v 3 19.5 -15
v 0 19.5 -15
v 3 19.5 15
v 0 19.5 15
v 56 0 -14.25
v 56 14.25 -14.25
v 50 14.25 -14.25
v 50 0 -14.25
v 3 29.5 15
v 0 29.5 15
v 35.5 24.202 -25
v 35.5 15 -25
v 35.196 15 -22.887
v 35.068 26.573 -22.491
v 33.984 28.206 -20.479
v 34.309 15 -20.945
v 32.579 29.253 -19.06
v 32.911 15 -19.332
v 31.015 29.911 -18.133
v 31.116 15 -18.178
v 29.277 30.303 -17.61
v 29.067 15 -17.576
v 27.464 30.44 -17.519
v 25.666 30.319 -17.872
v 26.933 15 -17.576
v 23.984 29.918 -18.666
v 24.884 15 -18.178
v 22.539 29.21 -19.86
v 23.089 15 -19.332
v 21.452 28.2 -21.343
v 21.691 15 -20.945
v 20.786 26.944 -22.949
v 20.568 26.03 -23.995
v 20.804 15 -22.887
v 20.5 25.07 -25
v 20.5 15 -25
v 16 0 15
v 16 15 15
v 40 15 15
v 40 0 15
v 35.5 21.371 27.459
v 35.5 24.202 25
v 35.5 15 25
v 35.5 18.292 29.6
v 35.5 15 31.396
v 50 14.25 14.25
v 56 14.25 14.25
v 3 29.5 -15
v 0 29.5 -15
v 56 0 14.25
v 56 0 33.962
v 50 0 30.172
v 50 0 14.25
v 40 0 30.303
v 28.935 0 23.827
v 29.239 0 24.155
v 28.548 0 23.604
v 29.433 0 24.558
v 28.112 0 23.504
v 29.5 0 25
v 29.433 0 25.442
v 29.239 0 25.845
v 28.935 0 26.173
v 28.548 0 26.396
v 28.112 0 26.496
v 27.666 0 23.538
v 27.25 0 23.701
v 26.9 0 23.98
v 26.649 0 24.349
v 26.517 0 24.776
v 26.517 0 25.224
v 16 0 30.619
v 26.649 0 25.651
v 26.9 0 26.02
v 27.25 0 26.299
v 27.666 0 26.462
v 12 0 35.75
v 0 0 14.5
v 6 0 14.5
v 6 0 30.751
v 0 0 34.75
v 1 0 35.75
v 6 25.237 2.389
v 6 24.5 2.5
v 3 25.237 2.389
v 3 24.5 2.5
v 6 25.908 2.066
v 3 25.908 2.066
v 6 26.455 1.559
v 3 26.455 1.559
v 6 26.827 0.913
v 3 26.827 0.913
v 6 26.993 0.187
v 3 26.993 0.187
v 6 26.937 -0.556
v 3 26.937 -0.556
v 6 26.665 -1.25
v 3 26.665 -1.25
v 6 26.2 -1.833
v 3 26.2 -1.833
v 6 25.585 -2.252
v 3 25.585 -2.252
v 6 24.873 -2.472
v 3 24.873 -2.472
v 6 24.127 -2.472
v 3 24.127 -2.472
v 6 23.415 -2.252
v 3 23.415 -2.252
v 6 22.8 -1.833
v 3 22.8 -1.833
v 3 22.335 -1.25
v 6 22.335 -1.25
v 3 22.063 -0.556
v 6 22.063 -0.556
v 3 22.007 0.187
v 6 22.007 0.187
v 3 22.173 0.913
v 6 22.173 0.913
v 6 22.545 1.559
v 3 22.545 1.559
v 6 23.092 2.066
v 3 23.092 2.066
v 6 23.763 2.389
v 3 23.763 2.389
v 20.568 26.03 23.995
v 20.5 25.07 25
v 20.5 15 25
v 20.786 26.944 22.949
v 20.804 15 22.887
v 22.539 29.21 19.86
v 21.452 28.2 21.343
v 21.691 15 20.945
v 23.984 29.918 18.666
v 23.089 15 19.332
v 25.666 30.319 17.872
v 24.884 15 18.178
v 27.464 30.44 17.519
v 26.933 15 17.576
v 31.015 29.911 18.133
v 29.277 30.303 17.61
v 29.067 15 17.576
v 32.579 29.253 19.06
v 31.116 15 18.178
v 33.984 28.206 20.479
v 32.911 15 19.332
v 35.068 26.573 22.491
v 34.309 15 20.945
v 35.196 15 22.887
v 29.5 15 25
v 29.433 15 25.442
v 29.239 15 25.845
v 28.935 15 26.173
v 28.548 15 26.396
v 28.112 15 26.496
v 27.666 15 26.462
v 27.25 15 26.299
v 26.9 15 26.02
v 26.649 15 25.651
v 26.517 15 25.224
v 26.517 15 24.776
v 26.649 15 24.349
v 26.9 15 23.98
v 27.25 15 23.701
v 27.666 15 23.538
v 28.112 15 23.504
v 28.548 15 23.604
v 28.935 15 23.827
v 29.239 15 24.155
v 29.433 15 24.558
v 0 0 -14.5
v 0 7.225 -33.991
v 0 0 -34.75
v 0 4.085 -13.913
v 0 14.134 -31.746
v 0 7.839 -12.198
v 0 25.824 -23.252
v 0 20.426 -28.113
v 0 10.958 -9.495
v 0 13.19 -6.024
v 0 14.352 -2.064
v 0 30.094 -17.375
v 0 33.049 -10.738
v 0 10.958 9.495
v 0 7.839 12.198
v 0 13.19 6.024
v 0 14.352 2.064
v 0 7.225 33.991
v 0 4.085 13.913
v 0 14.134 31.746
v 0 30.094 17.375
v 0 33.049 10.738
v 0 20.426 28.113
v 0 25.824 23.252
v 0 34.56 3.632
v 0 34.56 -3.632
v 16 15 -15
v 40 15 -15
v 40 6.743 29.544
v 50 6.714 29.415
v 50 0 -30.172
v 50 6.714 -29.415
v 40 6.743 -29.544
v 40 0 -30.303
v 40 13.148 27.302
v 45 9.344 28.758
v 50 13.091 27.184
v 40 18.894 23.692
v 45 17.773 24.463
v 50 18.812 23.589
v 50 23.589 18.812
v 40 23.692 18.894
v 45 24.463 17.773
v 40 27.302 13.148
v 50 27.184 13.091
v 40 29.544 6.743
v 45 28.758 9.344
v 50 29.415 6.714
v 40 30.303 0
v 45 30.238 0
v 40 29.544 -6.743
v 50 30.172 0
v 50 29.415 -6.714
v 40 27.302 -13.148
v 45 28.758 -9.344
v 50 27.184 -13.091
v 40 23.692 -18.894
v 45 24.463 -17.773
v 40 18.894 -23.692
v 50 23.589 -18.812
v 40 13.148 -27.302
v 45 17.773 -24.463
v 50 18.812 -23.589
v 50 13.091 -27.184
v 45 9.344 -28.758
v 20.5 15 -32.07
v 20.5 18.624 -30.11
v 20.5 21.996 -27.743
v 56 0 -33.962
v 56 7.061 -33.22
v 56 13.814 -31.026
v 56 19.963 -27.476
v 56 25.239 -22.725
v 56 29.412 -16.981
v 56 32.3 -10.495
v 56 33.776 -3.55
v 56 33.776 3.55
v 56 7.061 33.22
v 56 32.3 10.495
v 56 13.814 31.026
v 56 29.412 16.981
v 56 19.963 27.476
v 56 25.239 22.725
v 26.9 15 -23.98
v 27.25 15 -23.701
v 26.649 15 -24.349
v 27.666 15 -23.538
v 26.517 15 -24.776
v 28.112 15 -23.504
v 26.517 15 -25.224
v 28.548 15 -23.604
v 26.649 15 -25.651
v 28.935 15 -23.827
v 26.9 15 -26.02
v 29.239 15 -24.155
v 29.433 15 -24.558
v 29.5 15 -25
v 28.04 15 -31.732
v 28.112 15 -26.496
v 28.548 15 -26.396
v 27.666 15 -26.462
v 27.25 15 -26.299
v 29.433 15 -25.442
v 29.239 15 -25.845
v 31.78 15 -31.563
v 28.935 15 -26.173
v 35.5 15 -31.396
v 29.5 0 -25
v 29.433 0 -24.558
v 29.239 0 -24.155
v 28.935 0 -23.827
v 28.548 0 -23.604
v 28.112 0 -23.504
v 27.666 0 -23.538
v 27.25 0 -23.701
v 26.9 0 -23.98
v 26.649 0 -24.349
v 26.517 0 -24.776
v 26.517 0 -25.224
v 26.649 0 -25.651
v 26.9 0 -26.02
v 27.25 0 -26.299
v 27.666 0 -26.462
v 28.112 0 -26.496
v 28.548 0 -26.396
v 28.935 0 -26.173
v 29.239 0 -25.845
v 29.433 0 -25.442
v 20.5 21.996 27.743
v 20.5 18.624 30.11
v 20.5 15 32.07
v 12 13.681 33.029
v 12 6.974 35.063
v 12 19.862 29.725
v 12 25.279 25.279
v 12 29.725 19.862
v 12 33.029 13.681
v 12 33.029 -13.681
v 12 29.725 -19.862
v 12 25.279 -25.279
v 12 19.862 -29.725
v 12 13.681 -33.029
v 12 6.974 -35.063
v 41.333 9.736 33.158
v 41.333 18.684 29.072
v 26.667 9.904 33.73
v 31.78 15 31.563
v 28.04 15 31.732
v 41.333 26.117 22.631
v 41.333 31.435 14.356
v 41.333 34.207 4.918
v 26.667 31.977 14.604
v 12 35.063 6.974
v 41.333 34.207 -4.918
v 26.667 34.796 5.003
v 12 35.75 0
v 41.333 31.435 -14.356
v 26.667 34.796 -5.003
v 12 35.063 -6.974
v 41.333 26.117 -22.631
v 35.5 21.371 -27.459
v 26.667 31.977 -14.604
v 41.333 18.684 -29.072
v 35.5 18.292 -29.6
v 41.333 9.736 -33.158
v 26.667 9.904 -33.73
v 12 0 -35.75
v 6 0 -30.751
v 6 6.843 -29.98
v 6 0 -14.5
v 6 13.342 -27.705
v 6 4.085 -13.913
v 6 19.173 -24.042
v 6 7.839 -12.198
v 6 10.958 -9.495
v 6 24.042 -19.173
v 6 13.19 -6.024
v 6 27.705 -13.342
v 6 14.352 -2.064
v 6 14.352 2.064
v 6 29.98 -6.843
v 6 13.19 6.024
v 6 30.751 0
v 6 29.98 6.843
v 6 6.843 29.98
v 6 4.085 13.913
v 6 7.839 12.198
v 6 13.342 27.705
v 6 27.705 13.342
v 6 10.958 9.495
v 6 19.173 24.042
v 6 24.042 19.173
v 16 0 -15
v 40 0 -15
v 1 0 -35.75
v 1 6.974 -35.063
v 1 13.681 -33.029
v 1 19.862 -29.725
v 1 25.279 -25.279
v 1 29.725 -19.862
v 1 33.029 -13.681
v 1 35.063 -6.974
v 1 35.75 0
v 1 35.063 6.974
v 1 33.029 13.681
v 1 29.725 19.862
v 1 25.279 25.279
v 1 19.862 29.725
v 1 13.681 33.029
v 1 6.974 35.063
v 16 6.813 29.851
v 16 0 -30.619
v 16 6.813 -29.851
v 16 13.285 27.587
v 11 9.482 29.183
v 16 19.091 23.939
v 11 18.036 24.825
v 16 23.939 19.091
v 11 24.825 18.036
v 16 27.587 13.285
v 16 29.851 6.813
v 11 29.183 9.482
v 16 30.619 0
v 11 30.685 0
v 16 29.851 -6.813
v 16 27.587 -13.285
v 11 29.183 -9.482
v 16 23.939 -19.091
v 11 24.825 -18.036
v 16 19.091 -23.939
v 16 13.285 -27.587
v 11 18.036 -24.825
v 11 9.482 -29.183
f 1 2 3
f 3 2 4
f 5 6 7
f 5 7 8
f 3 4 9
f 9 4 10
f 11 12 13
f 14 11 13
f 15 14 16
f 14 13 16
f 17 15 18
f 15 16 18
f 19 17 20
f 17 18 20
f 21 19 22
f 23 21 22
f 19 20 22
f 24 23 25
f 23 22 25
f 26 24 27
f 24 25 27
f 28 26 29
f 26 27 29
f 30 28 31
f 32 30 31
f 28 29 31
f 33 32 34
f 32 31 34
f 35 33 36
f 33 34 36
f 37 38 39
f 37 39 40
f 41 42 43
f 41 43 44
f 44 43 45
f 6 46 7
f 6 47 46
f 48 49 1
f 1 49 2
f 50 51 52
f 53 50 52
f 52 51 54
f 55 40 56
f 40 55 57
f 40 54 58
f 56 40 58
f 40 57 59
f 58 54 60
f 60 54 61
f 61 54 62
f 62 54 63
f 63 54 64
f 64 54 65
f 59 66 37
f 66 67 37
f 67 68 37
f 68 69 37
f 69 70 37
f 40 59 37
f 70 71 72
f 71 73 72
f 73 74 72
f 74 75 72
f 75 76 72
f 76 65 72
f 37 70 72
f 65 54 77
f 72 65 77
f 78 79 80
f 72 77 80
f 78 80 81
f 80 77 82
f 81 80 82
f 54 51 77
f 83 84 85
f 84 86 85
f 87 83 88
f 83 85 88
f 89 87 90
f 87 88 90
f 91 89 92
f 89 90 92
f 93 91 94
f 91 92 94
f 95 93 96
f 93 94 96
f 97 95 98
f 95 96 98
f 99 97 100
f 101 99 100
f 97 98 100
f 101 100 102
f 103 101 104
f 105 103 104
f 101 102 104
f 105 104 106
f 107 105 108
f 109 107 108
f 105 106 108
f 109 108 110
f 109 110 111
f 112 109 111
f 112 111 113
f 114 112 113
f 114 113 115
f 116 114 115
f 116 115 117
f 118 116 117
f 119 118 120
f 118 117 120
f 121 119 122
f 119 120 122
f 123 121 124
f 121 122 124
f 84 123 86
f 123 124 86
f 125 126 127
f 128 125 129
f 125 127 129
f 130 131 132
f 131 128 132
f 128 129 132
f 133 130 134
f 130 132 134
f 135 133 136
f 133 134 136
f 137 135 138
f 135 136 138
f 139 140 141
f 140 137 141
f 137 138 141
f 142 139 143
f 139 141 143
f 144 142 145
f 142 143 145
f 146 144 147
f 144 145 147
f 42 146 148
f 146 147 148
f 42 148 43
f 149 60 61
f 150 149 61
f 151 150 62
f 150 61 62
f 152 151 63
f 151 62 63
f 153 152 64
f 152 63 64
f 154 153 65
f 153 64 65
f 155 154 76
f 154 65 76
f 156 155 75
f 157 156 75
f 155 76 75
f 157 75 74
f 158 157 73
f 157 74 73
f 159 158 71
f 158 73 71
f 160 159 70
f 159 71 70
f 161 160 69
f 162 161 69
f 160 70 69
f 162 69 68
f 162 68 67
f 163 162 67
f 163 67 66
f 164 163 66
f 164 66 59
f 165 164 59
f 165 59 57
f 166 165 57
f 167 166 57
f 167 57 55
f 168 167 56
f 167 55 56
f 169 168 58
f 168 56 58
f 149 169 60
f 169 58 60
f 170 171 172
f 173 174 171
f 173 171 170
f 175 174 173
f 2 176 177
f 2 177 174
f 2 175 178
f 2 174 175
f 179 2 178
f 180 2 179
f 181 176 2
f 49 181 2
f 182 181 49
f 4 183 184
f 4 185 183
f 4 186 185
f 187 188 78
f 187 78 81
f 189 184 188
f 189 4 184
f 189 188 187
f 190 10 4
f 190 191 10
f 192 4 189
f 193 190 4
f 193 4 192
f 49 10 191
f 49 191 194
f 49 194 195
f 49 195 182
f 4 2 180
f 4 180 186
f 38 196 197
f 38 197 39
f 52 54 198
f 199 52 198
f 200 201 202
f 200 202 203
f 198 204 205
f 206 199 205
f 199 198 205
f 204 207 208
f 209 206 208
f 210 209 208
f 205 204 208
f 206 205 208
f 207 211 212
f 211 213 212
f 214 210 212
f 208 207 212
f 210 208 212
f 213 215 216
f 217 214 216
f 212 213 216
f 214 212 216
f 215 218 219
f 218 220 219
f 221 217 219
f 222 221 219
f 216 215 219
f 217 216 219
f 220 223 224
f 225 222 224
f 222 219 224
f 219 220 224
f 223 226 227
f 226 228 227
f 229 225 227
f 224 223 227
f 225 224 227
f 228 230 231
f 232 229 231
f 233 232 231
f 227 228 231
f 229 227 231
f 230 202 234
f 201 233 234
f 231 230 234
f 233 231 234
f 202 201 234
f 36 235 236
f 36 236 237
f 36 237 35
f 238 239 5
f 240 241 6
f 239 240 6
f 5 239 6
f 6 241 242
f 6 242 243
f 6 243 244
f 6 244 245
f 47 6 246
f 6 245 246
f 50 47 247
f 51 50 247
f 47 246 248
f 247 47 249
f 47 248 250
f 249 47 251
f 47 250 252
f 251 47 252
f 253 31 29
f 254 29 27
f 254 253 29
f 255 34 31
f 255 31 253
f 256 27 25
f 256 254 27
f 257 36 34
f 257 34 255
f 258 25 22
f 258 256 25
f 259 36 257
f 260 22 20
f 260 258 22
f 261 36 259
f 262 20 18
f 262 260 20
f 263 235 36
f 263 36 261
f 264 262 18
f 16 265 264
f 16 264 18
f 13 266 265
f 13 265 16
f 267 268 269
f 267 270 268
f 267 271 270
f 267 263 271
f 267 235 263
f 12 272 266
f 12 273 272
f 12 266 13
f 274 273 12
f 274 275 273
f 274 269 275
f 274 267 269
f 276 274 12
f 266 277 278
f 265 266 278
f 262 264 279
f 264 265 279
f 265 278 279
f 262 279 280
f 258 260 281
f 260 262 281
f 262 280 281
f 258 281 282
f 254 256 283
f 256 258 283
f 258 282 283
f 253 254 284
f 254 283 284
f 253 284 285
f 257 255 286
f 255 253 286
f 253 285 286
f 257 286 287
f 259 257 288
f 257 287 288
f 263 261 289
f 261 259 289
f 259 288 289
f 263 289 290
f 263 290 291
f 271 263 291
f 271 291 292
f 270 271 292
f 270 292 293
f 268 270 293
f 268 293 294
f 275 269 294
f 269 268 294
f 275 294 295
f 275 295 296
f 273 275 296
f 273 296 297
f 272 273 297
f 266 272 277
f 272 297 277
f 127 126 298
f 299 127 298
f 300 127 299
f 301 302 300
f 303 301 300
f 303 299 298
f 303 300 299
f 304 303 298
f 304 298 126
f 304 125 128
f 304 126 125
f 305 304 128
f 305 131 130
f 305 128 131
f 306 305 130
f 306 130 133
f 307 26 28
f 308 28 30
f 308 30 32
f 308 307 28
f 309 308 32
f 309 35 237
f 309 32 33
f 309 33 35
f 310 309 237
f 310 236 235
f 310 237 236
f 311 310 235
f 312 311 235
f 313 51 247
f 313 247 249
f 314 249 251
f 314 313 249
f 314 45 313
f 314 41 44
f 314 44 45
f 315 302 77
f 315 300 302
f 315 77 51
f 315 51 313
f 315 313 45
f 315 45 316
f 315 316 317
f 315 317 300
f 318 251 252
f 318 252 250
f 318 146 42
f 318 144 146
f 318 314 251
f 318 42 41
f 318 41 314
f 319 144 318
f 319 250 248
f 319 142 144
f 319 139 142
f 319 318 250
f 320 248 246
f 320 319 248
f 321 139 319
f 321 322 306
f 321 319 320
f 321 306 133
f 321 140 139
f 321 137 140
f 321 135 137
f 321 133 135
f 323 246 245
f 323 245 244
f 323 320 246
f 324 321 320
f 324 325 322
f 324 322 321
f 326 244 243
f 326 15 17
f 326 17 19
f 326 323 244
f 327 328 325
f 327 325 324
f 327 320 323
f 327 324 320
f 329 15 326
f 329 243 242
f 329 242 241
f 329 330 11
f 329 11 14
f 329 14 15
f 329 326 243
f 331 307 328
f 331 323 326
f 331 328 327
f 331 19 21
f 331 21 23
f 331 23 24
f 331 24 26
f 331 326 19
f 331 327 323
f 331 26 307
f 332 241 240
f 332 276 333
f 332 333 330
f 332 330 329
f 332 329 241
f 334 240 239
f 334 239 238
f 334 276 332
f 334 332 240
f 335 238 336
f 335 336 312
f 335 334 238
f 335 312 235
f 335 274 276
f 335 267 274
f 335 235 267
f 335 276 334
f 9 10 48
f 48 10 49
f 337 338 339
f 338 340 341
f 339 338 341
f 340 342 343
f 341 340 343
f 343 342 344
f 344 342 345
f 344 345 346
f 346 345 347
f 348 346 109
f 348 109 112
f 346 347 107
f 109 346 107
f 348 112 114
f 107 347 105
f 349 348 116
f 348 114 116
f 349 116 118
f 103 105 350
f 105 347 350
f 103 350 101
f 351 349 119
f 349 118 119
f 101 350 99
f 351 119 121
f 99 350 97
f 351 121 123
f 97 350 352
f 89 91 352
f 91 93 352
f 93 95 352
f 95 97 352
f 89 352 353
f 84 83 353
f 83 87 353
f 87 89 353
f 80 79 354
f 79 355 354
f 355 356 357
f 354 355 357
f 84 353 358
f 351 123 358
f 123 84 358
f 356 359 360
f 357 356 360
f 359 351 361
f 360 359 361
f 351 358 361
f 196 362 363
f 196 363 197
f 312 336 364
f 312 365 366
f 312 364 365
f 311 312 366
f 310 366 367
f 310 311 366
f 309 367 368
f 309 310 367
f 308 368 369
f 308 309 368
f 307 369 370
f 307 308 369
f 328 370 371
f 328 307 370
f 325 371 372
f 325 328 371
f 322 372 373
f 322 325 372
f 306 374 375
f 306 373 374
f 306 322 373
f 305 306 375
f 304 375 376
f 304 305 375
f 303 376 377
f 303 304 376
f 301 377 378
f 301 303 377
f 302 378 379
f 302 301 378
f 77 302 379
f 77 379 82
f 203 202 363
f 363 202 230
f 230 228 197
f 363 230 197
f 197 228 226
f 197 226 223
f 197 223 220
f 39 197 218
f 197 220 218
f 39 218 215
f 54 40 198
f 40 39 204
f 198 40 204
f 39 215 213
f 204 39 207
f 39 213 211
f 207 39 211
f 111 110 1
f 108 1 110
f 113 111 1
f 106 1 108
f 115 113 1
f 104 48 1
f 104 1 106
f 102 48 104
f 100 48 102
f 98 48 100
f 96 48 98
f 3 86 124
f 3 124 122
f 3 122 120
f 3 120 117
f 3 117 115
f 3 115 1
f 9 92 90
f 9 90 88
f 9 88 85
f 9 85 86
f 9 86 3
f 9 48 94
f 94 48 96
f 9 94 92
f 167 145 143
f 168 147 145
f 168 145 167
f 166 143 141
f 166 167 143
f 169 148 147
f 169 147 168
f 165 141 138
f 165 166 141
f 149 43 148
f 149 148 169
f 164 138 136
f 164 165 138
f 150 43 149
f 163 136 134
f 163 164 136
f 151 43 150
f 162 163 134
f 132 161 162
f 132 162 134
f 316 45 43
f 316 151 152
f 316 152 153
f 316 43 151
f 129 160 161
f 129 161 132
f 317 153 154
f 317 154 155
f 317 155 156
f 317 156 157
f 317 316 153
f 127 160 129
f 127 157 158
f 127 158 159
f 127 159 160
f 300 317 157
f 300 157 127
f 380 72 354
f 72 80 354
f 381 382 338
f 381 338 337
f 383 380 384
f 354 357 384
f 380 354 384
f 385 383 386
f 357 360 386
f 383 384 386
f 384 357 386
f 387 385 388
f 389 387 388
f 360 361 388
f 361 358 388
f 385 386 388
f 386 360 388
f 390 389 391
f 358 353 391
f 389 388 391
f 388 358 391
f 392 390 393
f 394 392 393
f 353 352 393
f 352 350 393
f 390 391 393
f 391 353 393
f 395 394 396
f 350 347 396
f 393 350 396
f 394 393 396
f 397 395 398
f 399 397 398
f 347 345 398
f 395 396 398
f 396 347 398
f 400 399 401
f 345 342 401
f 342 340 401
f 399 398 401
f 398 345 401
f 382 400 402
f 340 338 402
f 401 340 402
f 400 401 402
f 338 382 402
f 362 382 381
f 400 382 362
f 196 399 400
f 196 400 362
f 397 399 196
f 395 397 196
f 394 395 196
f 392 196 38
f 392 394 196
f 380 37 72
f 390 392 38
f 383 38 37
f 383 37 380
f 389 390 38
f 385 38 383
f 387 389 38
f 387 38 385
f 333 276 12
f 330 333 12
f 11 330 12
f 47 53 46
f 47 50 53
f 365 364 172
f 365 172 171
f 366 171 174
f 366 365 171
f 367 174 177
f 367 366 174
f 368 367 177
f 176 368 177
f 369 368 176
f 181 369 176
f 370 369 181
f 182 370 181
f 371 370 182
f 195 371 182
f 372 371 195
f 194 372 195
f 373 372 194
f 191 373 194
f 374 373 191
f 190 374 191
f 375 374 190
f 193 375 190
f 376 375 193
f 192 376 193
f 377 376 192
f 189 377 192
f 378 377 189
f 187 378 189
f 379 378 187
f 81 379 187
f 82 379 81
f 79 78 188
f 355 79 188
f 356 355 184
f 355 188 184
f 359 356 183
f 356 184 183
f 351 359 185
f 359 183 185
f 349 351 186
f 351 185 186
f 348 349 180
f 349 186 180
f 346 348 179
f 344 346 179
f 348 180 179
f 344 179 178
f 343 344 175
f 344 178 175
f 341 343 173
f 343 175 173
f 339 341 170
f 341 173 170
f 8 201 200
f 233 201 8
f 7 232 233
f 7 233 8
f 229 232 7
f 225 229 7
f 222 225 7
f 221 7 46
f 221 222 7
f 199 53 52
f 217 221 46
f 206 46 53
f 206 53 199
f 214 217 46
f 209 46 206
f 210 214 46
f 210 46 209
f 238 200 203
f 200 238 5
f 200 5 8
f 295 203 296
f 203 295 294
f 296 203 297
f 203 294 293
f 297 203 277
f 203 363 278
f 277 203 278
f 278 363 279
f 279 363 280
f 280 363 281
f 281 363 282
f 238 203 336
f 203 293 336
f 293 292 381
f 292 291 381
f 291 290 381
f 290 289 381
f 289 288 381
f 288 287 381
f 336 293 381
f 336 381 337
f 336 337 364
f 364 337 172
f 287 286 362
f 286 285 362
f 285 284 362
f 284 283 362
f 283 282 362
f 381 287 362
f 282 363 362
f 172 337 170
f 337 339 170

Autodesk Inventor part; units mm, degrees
ref_plane "YZ Plane" through (0, 0, 0) normal (1, 0, 0) x (0, 1, 0)
sketch "Sketch1" plane through (0, 0, 0) normal (0, 1, 0) x (-1, 0, 0)
  line L0 (0, 0) -> (0, 35.75)
  line L1 (0, 0) -> (-56, 0)
  line L2 (-56, 0) -> (-56, 33.9625)
  line L3 (11.2, 0) -> (-67.2, 0) projected
  line L4 (-50, 30.1718) -> (-50, 6)
  line L5 (-6, 6) -> (-6, 30.7506)
  line L6 (-6, 30.7506) -> (-50, 30.1718)
  line L7 (-28, 0) -> (-28, 30.4612)
  line L8 (-16, 0) -> (-16, 30.619)
  line L9 (-40, 0) -> (-40, 30.3033)
  line L10 (-50, 6) -> (-40, 6)
  line L11 (-16, 6) -> (-6, 6)
  line L12 (0, 35.75) -> (-12, 35.75)
  line L13 (-12, 35.75) -> (-56, 33.9625)
  dimension "d1" = 33.9625
  dimension "d8" = 35.75
  dimension "d10" = 56
  dimension "d22" = 28
  dimension "d23" = 12
  dimension "d24" = 12
  dimension "d29" = 12
revolve "Revolution1" add sketch "Sketch1" angle 180 about axis through (-10, 0, 0) along (-1, 0, 0) contours L1 L8 L11 L5 L6 L4 L10 L9 L2 L13 L12 L0 | L1 L7 L6 L8 | L1 L9 L6 L7
ref_plane "Work Plane1" through (6, 0, 0) normal (-1, 0, 0) x (0, 0, -1)
sketch "Sketch3" plane through (6, 0, 0) normal (-1, 0, 0) x (0, 0, -1)
  line L0 (-15, 15) -> (15, 15)
  line L1 (15, 15) -> (15, -15)
  line L2 (15, -15) -> (-15, -15)
  line L3 (-15, -15) -> (-15, 15)
  line L4 (-15, 15) -> (15, -15) construction
  line L5 (15, 15) -> (-15, -15) construction
  point P0 (0, 0)
  dimension "d12" = 30
  dimension "d13" = 30
extrude "Extrusion2" cut sketch "Sketch3" against normal blind 44
sketch "Sketch4" plane through (0, 0, 0) normal (-1, 0, 0) x (0, 0, -1)
  circle A0 centre (0, 0) radius 14.5
  point P0 (0, 0)
  dimension "d16" = 29
extrude "Extrusion3" cut sketch "Sketch4" against normal blind 6
sketch "Sketch5" plane through (56, 0, 0) normal (1, 0, 0) x (0, 0, -1)
  line L0 (14.25, -14.25) -> (-14.25, -14.25)
  line L1 (-14.25, -14.25) -> (-14.25, 14.25)
  line L2 (-14.25, 14.25) -> (14.25, 14.25)
  line L3 (14.25, 14.25) -> (14.25, -14.25)
  line L4 (14.25, -14.25) -> (-14.25, 14.25) construction
  line L5 (-14.25, -14.25) -> (14.25, 14.25) construction
  point P0 (0, 0)
  dimension "d25" = 28.5
  dimension "d26" = 28.5
extrude "Extrusion4" cut sketch "Sketch5" against normal blind 6
chamfer "Chamfer3" distance 1 angle 45 1 edges at (0, 35.75, 0)
sketch "Sketch6" plane through (16, 0, 15) normal (0, -1, 0) x (1, 0, 0)
  line L0 (-16, 19.75) -> (-15, 20.75) projected
  line L1 (-16, -0.5) -> (-16, 19.75) projected
  line L2 (-16, -0.5) -> (-10, -0.5) projected
  line L3 (-10, -0.5) -> (-10, 15.7506) projected
  line L4 (-10, 15.7506) -> (0, 15.619) projected
  line L5 (0, 15.619) -> (0, 0) projected
  line L6 (0, 0) -> (24, 0) projected
  line L7 (24, 0) -> (24, 15.3033) projected
  line L8 (24, 15.3033) -> (34, 15.1718) projected
  line L9 (34, 15.1718) -> (34, -0.75) projected
  line L10 (34, -0.75) -> (40, -0.75) projected
  line L11 (40, 18.9625) -> (40, -0.75) projected
  line L12 (-4, 20.75) -> (40, 18.9625) projected
  line L13 (-15, 20.75) -> (-4, 20.75) projected
  line L14 (-16, -15) -> (40, -15)
  line L15 (40, -0.75) -> (40, -29.25) projected
  line L16 (13, -15) -> (38, -15) construction
  line L17 (12, -15) -> (12, 10)
  line L18 (12, -15) -> (37, -15) construction
  circle A0 centre (12, 10) radius 1.5
  dimension "d46" = 25
  dimension "d47" = 90
  dimension "d48" = 3
extrude "Extrusion5" cut sketch "Sketch6" against normal through all contours A0
ref_plane "Work Plane2" through (0, 15, 0) normal (0, 1, 0) x (-1, 0, 0)
sketch "Sketch7" plane through (0, 15, 0) normal (0, 1, 0) x (-1, 0, 0)
  circle A0 centre (-28, 25) radius 1.5 projected
  arc A1 (-35.5, 25) -> (-20.5, 25) centre (-28, 25) ccw
  spline S0 degree 5 poles (-29.5, 25) (-29.5, 25.2111) (-29.4629, 25.4204) (-29.3897, 25.6231) (-29.2804, 25.8128) (-29.0332, 26.0983) (-28.9152, 26.2048) (-28.7791, 26.2979) (-28.6269, 26.3735) (-28.3307, 26.4697) (-28.1905, 26.4982) (-28.0469, 26.5095) (-27.9041, 26.5034) (-27.5429, 26.4465) (-27.3324, 26.3699) (-27.1499, 26.2607) (-26.9942, 26.1299) (-26.7049, 25.7958) (-26.5873, 25.5835) (-26.513, 25.3527) (-26.4842, 25.1114) (-26.5242, 24.6611) (-26.578, 24.4533) (-26.6719, 24.2502) (-26.8064, 24.0618) (-27.1556, 23.7366) (-27.3724, 23.6017) (-27.6224, 23.5132) (-27.8827, 23.4833) (-28.3338, 23.524) (-28.5277, 23.5752) (-28.7076, 23.6563) (-28.8674, 23.7623) (-29.2025, 24.0647) (-29.3531, 24.2808) (-29.4523, 24.5167) (-29.5, 24.7592) (-29.5, 25) knots 0 0 0 0 0 0 0.12181 0.12181 0.12181 0.12181 0.205743 0.205743 0.205743 0.205743 0.273981 0.273981 0.273981 0.273981 0.384852 0.384852 0.384852 0.384852 0.524069 0.524069 0.524069 0.524069 0.641928 0.641928 0.641928 0.641928 0.764397 0.764397 0.764397 0.764397 0.86105 0.86105 0.86105 0.86105 1 1 1 1 1 1 projected
  line L0 (-12, 35.75) -> (-56, 33.9625) projected
  line L1 (-56, 33.9625) -> (-56, -33.9625) projected
  line L2 (-12, -35.75) -> (-56, -33.9625) projected
  line L3 (-12, 35.75) -> (-12, -35.75) projected
  line L4 (-20.5, 25) -> (-20.5, 35.4047)
  line L5 (-35.5, 25) -> (-35.5, 34.7953)
  point P0 (0, 0)
  dimension "d50" = 15
extrude "Extrusion7" cut sketch "Sketch7" along normal blind 40 contours L5 L0 L4 A1
sketch "Sketch8" plane through (0, 0, 0) normal (-1, 0, 0) x (0, 0, 1)
  line L0 (0, 0) -> (0, 19.5)
  line L1 (0, 19.5) -> (15, 19.5)
  line L2 (15, 19.5) -> (15, 29.5)
  line L3 (15, 29.5) -> (-15, 29.5)
  line L4 (-15, 29.5) -> (-15, 19.5)
  line L5 (-15, 19.5) -> (0, 19.5)
  dimension "d61" = 19.5
  dimension "d62" = 15
  dimension "d63" = 10
  dimension "d64" = 30
  dimension "d65" = 90
  dimension "d66" = 10
extrude "Extrusion8" cut sketch "Sketch8" against normal blind 3
mirror "Mirror3" about plane through (0, 0, 0) normal (0, 0, 1) of "Extrusion5", "Extrusion7"
sketch "Sketch10" plane through (3, 0, 0) normal (-1, 0, 0) x (0, 0, 1)
  line L0 (15, 19.5) -> (-15, 19.5) projected
  line L1 (15, 29.5) -> (15, 19.5) projected
  line L2 (-15, 29.5) -> (15, 29.5) projected
  line L3 (-15, 19.5) -> (-15, 29.5) projected
  line L4 (-15, 19.5) -> (-15, 29.5) projected
  line L5 (-15, 19.5) -> (15, 29.5)
  circle A0 centre (0, 24.5) radius 2.5
  point P0 (0, 0)
  dimension "d67" = 5
extrude "Extrusion9" cut sketch "Sketch10" against normal up to next contours A0 L5 | L5 A0
equation "\"d8\" = 0.5 * pipeID"
equation "\"d22\" = 0.5 * d10"
equation "\"d23\" = 2 * wallTh"
equation "\"d24\" = 2 * wallTh"
equation "\"d29\" = 2 * wallTh"
equation "\"d17\" = wallTh"
equation "\"d27\" = wallTh"
equation "\"pipeID\" = 71.5"
equation "\"wallTh\" = 6"
equation "\"taper\" = 0.95"
equation "\"d11\" = -wallTh"
properties part number "cameraHolder"
